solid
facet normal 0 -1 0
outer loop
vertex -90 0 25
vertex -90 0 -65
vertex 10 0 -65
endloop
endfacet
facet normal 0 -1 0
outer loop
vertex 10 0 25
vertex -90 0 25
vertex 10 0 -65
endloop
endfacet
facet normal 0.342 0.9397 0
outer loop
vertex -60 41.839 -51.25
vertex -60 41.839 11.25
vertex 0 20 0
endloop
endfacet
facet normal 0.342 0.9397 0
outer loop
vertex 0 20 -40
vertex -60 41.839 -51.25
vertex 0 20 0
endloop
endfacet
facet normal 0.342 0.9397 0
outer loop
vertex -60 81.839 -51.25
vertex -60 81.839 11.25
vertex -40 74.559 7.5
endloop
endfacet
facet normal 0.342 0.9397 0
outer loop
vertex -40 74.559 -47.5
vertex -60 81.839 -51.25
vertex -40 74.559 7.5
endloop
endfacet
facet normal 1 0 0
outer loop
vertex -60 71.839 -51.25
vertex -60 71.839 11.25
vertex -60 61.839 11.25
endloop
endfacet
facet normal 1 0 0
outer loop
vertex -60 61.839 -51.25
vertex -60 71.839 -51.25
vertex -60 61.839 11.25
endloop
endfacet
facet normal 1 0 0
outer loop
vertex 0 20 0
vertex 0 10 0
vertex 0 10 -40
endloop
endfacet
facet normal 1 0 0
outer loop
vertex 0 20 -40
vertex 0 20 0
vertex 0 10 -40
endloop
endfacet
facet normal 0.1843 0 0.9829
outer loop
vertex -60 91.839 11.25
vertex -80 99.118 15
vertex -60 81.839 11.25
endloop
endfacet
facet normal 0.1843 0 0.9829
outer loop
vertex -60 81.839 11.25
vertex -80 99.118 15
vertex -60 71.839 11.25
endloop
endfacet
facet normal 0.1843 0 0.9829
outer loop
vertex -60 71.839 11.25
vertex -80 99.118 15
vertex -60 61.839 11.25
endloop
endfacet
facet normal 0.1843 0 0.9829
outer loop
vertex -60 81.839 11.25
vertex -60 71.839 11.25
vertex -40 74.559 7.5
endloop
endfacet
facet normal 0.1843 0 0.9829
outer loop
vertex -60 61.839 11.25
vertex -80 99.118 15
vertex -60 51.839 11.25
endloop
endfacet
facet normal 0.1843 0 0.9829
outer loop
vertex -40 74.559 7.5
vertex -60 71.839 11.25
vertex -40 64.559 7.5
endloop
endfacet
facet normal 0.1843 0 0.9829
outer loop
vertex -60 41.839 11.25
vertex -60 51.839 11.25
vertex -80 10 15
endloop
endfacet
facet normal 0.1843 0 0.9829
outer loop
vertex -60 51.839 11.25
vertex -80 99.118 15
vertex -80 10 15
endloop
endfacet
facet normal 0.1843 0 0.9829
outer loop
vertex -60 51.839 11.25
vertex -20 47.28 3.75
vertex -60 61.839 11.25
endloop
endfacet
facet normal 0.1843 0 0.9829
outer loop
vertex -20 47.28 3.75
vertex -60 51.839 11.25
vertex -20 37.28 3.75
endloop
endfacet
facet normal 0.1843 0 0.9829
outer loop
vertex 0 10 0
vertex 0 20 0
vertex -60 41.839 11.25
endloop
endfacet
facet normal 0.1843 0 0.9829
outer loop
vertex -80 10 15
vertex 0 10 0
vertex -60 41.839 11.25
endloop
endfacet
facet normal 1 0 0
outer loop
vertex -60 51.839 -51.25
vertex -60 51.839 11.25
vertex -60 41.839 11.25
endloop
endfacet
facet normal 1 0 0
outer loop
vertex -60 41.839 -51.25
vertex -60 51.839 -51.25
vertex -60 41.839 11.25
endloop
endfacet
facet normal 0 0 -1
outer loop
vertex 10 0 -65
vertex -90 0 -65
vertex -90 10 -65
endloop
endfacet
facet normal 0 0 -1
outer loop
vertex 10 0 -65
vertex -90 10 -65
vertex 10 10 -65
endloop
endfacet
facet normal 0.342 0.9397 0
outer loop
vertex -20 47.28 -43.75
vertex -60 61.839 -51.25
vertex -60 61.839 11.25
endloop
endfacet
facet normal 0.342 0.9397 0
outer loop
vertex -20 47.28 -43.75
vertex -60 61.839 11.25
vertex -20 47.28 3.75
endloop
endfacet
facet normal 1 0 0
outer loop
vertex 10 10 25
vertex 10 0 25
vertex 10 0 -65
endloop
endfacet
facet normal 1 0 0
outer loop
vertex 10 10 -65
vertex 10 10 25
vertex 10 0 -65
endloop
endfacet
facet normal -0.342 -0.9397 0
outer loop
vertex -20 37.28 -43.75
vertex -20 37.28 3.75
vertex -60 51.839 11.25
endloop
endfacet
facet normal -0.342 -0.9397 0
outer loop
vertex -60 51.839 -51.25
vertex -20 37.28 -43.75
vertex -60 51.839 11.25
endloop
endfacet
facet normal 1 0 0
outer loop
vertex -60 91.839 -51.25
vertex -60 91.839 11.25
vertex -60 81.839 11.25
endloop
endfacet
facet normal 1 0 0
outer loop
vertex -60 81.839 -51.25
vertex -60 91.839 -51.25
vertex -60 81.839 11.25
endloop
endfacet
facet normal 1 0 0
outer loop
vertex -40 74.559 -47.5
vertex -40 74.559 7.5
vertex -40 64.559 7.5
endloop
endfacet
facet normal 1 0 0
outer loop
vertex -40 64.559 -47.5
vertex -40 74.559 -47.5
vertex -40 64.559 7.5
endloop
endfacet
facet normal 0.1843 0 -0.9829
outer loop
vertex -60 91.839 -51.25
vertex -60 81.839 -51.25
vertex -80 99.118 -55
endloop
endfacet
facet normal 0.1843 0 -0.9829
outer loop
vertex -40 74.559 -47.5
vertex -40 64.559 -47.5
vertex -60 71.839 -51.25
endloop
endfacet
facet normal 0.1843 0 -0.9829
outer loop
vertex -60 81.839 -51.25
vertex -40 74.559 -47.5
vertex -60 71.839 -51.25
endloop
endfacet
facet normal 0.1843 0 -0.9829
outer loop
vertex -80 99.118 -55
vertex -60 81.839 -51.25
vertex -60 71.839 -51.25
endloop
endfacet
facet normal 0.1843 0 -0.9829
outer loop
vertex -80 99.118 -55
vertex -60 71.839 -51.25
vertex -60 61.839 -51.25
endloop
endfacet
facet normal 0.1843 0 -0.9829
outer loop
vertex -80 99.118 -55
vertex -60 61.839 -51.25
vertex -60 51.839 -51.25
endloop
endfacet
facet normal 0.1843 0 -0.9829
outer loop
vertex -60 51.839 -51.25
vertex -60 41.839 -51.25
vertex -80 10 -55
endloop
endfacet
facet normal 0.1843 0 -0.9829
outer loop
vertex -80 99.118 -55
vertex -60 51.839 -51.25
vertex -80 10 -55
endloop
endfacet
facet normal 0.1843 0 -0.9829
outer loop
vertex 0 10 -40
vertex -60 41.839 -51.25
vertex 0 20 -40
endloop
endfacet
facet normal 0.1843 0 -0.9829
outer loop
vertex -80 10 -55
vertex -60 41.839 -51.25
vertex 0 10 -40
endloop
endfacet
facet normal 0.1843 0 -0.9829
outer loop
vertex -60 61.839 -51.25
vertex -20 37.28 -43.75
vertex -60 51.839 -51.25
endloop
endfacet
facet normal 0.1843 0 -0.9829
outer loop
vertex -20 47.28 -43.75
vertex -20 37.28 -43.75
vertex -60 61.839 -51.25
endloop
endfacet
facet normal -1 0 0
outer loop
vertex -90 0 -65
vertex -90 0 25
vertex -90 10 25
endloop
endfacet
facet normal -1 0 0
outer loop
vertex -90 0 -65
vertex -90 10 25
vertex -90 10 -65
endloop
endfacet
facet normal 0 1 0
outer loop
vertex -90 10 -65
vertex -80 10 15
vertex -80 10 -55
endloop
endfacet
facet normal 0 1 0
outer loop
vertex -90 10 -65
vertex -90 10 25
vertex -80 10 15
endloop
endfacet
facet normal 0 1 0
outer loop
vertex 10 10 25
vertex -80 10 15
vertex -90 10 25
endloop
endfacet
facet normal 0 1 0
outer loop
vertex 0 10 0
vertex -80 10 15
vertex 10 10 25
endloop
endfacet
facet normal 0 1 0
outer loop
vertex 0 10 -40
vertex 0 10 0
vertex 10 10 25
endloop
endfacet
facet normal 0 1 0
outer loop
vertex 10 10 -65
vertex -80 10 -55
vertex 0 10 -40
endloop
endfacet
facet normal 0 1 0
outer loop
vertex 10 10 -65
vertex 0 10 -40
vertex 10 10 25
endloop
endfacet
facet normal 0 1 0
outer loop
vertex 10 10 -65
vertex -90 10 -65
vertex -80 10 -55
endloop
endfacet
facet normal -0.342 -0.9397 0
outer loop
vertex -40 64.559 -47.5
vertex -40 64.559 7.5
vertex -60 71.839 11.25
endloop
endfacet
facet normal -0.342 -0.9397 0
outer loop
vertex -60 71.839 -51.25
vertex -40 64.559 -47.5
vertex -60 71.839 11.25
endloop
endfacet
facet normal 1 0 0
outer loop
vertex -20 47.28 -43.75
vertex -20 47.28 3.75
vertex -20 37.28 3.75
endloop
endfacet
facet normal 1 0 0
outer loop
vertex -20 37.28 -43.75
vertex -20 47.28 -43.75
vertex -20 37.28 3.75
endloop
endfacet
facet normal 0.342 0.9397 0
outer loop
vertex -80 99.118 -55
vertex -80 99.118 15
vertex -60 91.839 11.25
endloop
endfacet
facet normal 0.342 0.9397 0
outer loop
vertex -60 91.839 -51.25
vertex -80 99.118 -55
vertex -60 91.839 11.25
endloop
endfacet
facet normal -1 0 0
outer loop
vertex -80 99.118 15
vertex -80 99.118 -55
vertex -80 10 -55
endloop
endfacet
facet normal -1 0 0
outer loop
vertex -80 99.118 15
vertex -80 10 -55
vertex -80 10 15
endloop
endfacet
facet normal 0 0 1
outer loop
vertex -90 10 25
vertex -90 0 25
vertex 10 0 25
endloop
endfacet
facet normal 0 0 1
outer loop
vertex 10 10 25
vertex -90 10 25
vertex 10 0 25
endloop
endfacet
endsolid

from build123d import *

# Parameters (mm, degrees)
SKETCH1_W      = 100
SKETCH1_H      = 90
EXTRUDE1_DEPTH = 10
EXTRUDE2_DEPTH = 89.118
EXTRUDE3_DEPTH = 64.559


with BuildPart() as part:
    # Sketch1 → Extrude1 (new body)
    with BuildSketch(Plane(origin=(0, 0, 0), x_dir=(1, 0, 0), z_dir=(0, 1, 0))):
        with Locations((-40, 20)):
            Rectangle(SKETCH1_W, SKETCH1_H)
    extrude(amount=EXTRUDE1_DEPTH)

    # Sketch2 → Extrude2 (add)
    with BuildSketch(Plane(origin=(0, 10, 0), x_dir=(1, 0, 0), z_dir=(0, 1, 0))):
        Polygon((0, 0), (0, 40), (-80, 55), (-80, -15), align=None)
    extrude(amount=EXTRUDE2_DEPTH)

    # Sketch3 → Extrude3 (cut, symmetric)
    with BuildSketch(Plane.XY):
        Polygon((0, 99.118), (-80, 99.118), (-60, 91.838595315), (-60, 81.838595315), (-40, 74.559190629), (-40, 64.559190629), (-60, 71.838595315), (-60, 61.838595315), (-20, 47.279785944), (-20, 37.279785944), (-60, 51.838595315), (-60, 41.838595315), (0, 20.000381259), (0, 30.000381259), align=None)
    extrude(amount=EXTRUDE3_DEPTH, both=True, mode=Mode.SUBTRACT)


solid = part.part
